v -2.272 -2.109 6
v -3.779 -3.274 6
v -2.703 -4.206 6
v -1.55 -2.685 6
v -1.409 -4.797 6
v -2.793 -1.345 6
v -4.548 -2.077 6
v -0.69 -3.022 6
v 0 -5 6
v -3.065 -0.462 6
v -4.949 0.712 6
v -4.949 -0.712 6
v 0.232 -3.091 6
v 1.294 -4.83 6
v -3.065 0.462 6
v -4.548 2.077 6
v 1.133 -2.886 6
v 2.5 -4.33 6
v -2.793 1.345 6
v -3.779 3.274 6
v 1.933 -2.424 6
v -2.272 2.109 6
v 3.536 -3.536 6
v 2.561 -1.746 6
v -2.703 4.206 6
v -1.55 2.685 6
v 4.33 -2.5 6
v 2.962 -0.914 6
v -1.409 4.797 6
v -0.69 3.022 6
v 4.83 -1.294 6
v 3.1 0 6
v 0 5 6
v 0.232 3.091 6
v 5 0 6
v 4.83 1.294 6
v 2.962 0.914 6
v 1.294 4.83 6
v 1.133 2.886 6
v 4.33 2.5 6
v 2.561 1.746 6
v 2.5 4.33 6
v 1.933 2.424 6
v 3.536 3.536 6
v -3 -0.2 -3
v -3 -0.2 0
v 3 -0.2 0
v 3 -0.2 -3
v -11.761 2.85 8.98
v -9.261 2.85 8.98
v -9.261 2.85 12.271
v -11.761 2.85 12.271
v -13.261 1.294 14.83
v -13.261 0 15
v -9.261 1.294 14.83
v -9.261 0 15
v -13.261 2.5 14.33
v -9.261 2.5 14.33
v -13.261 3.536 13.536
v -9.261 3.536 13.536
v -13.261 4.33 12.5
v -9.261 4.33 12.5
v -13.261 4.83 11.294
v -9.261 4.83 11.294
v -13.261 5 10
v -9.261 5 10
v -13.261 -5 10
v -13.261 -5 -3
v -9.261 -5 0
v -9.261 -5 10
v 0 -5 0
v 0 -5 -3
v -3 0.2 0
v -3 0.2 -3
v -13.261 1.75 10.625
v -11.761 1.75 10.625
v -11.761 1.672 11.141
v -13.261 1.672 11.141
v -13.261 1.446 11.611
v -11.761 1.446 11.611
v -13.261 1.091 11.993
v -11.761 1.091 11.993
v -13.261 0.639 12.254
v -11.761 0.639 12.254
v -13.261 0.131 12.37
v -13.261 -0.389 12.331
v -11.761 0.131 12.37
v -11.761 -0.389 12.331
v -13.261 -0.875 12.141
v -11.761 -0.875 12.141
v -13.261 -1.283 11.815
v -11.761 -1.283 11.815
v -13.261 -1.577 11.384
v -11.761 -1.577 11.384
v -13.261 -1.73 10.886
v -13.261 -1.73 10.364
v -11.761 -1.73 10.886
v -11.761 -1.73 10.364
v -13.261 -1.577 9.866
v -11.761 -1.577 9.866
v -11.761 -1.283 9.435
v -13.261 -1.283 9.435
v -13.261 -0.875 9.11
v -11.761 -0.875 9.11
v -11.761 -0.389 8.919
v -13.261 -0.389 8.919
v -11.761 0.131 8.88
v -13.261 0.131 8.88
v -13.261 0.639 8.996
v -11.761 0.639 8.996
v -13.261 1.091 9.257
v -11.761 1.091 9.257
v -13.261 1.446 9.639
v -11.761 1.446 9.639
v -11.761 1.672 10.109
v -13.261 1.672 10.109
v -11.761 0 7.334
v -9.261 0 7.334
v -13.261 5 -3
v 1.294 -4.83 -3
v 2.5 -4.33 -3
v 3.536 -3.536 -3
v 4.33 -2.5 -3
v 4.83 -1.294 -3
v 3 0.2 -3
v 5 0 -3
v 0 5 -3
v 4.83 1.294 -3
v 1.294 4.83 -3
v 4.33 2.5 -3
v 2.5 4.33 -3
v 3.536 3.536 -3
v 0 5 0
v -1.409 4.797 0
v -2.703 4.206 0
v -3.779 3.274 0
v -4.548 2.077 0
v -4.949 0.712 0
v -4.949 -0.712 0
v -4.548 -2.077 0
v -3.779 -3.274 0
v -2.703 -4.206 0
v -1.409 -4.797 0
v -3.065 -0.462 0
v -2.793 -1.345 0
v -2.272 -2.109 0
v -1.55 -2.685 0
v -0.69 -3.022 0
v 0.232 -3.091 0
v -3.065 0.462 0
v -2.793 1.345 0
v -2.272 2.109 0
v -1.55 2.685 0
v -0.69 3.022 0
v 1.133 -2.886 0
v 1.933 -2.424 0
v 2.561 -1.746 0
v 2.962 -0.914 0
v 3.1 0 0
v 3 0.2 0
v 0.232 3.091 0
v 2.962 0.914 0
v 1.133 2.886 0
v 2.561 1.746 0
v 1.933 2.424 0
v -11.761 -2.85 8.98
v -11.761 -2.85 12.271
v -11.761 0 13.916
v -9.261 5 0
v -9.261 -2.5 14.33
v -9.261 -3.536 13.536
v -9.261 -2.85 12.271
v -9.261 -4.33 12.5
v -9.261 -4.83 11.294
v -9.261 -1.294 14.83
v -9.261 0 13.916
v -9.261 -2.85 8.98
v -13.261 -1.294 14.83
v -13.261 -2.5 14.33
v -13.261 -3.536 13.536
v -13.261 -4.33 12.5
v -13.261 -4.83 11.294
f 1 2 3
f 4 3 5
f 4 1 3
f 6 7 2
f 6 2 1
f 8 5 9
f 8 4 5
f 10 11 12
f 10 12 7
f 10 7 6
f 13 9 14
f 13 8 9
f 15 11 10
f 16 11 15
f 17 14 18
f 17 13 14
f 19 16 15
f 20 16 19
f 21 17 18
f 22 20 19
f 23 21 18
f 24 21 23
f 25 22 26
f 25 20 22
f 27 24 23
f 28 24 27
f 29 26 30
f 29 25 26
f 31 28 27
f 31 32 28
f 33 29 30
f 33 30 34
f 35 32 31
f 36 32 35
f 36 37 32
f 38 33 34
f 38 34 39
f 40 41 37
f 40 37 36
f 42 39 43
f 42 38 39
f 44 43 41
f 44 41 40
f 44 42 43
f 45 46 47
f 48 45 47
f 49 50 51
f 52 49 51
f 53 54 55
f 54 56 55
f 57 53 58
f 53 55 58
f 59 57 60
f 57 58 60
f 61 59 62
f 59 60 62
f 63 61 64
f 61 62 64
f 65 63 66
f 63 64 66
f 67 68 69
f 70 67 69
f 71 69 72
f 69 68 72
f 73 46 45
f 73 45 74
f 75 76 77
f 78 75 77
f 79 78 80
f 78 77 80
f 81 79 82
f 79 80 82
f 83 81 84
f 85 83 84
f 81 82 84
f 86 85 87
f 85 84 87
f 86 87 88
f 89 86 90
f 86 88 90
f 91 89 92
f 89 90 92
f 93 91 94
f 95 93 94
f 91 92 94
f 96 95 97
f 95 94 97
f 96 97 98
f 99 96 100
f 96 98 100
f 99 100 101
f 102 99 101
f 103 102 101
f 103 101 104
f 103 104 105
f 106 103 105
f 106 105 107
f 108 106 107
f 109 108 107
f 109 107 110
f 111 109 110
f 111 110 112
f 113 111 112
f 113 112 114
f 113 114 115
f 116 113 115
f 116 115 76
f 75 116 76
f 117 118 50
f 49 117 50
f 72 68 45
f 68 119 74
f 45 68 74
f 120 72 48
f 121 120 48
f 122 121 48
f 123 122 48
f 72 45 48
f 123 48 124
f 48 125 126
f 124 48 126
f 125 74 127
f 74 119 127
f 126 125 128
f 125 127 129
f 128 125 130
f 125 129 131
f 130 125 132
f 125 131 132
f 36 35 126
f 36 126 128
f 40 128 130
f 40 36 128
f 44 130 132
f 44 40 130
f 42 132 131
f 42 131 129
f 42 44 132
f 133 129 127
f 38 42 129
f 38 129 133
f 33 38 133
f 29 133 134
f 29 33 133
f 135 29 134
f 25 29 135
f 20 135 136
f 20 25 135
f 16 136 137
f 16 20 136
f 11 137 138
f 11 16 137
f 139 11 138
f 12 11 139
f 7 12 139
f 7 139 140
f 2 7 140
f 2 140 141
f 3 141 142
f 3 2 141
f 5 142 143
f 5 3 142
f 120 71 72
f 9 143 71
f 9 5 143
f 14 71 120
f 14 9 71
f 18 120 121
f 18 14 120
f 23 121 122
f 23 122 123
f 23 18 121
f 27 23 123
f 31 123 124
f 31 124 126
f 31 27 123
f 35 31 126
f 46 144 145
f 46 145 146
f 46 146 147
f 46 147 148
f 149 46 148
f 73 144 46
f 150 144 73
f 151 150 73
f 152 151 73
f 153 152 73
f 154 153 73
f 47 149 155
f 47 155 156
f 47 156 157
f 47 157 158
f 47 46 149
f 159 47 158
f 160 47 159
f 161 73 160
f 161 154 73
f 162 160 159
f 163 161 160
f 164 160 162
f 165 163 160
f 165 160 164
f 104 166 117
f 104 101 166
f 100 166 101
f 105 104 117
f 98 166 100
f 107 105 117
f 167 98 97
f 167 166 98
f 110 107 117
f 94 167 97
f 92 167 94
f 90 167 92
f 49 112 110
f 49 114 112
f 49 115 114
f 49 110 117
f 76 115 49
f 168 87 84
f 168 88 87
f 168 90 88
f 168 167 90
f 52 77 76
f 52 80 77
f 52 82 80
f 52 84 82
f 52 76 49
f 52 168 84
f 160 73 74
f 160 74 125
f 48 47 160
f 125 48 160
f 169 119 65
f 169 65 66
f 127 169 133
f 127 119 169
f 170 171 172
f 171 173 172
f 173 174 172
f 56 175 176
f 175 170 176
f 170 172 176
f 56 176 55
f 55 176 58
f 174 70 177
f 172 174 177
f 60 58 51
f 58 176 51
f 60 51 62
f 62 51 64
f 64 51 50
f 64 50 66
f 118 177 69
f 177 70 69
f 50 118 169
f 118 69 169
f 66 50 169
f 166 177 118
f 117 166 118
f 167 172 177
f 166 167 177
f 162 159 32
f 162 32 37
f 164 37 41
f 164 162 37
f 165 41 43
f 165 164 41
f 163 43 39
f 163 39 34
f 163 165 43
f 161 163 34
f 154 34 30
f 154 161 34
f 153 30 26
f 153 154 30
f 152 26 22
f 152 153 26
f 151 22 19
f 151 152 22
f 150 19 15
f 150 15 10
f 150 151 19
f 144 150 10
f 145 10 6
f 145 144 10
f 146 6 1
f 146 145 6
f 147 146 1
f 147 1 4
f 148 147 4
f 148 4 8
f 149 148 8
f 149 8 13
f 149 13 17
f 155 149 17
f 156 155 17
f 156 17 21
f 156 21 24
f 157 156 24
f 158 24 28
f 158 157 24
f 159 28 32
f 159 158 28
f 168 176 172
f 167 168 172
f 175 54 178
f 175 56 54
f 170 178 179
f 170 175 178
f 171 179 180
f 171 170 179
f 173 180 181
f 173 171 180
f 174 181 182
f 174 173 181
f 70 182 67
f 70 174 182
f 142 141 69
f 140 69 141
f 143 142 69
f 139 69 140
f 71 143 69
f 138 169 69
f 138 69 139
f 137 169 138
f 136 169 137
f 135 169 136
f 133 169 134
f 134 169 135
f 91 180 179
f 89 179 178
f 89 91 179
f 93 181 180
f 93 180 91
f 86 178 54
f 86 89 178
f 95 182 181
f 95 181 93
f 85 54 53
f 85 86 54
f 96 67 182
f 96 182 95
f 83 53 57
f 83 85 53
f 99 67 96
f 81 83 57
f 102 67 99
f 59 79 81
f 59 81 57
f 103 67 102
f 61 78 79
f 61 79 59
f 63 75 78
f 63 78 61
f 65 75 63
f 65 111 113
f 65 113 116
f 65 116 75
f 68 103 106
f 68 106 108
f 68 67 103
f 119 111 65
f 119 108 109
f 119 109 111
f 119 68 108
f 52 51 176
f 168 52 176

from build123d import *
from build123d import SkipClean  # not in build123d's __all__

# Parameters (mm, degrees)
F0_R      = 3.1
F0_R_2    = 1
F1_DEPTH  = 3
F2_DEPTH  = 6
F3_W      = 4
F3_H      = 10
F4_DEPTH  = 15
F5_R      = 1.75
F6_DEPTH  = 25
F8_DEPTH  = 2.5
F9_R      = 4.99999
F10_W     = 6
F10_H     = 0.4
F11_DEPTH = 25


# Not quite as in the source:
# - a fillet or chamfer is up to 0.001 mm smaller than in the source, because OpenCascade refuses the exact size
# - after a boolean that leaves OpenCascade's solid faulty, fix() repairs it


with BuildPart() as f1:
    # F0 (on Top) → F1 (new body)
    with BuildSketch(Plane.XY):
        with BuildLine():
            ThreePointArc((0, -5), (3.5355339059, -3.5355339059), (5, 0))
            ThreePointArc((5, 0), (3.5355339059, 3.5355339059), (0, 5))
            ThreePointArc((0, 5), (-5, 0), (0, -5))
        make_face()
        Circle(F0_R, mode=Mode.SUBTRACT)
        Circle(F0_R)
        Circle(F0_R_2, mode=Mode.SUBTRACT)
        with BuildLine():
            ThreePointArc((0, -5), (-5, 0), (0, 5))
            Line((0, 5), (-13.260579668, 5))
            Line((-13.260579668, 5), (-13.260579668, -5))
            Line((-13.260579668, -5), (0, -5))
        make_face()
        Circle(F0_R_2)
    extrude(amount=-F1_DEPTH)

    # F0 (on Top) → F2 (join)
    with BuildSketch(Plane.XY):
        with BuildLine():
            ThreePointArc((0, -5), (3.5355339059, -3.5355339059), (5, 0))
            ThreePointArc((5, 0), (3.5355339059, 3.5355339059), (0, 5))
            ThreePointArc((0, 5), (-5, 0), (0, -5))
        make_face()
        Circle(F0_R, mode=Mode.SUBTRACT)
    with SkipClean():  # cleaning this boolean's faces spoils the solid; the shape is the same uncleaned
        extrude(amount=F2_DEPTH)

    # F3 (on face) → F4 (join)
    with BuildSketch(Plane.XY):
        with Locations((-11.260579668, 0)):
            Rectangle(F3_W, F3_H)
    extrude(amount=F4_DEPTH)

    add(f1.part.fix(), mode=Mode.REPLACE)

    # F5 (on face) → F6 (cut)
    with BuildSketch(Plane.YZ.offset(-9.260579668)):
        with Locations((0, 10.6251845136)):
            Circle(F5_R)
    extrude(amount=-F6_DEPTH, mode=Mode.SUBTRACT)

    # F7 (on face) → F8 (cut)
    with BuildSketch(Plane.YZ.offset(-9.260579668)):
        Polygon((0, 7.3342879792), (2.85, 8.9797362464), (2.85, 12.2706327808), (0, 13.916081048), (-2.85, 12.2706327808), (-2.85, 8.9797362464), align=None)
    extrude(amount=-F8_DEPTH, mode=Mode.SUBTRACT)

    # F9 (radius 5 in the source; OpenCascade refuses exactly that, so slightly less here)
    f9_edges = [f1.edges().sort_by_distance(p)[0] for p in [
        (-11.26058, -5, 15),
        (-11.26058, 5, 15),
    ]]
    fillet(f9_edges, radius=F9_R)

    # F10 (on face) → F11 (cut)
    with BuildSketch(Plane.XY):
        Rectangle(F10_W, F10_H)
    extrude(amount=-F11_DEPTH, mode=Mode.SUBTRACT)


solid = f1.part
